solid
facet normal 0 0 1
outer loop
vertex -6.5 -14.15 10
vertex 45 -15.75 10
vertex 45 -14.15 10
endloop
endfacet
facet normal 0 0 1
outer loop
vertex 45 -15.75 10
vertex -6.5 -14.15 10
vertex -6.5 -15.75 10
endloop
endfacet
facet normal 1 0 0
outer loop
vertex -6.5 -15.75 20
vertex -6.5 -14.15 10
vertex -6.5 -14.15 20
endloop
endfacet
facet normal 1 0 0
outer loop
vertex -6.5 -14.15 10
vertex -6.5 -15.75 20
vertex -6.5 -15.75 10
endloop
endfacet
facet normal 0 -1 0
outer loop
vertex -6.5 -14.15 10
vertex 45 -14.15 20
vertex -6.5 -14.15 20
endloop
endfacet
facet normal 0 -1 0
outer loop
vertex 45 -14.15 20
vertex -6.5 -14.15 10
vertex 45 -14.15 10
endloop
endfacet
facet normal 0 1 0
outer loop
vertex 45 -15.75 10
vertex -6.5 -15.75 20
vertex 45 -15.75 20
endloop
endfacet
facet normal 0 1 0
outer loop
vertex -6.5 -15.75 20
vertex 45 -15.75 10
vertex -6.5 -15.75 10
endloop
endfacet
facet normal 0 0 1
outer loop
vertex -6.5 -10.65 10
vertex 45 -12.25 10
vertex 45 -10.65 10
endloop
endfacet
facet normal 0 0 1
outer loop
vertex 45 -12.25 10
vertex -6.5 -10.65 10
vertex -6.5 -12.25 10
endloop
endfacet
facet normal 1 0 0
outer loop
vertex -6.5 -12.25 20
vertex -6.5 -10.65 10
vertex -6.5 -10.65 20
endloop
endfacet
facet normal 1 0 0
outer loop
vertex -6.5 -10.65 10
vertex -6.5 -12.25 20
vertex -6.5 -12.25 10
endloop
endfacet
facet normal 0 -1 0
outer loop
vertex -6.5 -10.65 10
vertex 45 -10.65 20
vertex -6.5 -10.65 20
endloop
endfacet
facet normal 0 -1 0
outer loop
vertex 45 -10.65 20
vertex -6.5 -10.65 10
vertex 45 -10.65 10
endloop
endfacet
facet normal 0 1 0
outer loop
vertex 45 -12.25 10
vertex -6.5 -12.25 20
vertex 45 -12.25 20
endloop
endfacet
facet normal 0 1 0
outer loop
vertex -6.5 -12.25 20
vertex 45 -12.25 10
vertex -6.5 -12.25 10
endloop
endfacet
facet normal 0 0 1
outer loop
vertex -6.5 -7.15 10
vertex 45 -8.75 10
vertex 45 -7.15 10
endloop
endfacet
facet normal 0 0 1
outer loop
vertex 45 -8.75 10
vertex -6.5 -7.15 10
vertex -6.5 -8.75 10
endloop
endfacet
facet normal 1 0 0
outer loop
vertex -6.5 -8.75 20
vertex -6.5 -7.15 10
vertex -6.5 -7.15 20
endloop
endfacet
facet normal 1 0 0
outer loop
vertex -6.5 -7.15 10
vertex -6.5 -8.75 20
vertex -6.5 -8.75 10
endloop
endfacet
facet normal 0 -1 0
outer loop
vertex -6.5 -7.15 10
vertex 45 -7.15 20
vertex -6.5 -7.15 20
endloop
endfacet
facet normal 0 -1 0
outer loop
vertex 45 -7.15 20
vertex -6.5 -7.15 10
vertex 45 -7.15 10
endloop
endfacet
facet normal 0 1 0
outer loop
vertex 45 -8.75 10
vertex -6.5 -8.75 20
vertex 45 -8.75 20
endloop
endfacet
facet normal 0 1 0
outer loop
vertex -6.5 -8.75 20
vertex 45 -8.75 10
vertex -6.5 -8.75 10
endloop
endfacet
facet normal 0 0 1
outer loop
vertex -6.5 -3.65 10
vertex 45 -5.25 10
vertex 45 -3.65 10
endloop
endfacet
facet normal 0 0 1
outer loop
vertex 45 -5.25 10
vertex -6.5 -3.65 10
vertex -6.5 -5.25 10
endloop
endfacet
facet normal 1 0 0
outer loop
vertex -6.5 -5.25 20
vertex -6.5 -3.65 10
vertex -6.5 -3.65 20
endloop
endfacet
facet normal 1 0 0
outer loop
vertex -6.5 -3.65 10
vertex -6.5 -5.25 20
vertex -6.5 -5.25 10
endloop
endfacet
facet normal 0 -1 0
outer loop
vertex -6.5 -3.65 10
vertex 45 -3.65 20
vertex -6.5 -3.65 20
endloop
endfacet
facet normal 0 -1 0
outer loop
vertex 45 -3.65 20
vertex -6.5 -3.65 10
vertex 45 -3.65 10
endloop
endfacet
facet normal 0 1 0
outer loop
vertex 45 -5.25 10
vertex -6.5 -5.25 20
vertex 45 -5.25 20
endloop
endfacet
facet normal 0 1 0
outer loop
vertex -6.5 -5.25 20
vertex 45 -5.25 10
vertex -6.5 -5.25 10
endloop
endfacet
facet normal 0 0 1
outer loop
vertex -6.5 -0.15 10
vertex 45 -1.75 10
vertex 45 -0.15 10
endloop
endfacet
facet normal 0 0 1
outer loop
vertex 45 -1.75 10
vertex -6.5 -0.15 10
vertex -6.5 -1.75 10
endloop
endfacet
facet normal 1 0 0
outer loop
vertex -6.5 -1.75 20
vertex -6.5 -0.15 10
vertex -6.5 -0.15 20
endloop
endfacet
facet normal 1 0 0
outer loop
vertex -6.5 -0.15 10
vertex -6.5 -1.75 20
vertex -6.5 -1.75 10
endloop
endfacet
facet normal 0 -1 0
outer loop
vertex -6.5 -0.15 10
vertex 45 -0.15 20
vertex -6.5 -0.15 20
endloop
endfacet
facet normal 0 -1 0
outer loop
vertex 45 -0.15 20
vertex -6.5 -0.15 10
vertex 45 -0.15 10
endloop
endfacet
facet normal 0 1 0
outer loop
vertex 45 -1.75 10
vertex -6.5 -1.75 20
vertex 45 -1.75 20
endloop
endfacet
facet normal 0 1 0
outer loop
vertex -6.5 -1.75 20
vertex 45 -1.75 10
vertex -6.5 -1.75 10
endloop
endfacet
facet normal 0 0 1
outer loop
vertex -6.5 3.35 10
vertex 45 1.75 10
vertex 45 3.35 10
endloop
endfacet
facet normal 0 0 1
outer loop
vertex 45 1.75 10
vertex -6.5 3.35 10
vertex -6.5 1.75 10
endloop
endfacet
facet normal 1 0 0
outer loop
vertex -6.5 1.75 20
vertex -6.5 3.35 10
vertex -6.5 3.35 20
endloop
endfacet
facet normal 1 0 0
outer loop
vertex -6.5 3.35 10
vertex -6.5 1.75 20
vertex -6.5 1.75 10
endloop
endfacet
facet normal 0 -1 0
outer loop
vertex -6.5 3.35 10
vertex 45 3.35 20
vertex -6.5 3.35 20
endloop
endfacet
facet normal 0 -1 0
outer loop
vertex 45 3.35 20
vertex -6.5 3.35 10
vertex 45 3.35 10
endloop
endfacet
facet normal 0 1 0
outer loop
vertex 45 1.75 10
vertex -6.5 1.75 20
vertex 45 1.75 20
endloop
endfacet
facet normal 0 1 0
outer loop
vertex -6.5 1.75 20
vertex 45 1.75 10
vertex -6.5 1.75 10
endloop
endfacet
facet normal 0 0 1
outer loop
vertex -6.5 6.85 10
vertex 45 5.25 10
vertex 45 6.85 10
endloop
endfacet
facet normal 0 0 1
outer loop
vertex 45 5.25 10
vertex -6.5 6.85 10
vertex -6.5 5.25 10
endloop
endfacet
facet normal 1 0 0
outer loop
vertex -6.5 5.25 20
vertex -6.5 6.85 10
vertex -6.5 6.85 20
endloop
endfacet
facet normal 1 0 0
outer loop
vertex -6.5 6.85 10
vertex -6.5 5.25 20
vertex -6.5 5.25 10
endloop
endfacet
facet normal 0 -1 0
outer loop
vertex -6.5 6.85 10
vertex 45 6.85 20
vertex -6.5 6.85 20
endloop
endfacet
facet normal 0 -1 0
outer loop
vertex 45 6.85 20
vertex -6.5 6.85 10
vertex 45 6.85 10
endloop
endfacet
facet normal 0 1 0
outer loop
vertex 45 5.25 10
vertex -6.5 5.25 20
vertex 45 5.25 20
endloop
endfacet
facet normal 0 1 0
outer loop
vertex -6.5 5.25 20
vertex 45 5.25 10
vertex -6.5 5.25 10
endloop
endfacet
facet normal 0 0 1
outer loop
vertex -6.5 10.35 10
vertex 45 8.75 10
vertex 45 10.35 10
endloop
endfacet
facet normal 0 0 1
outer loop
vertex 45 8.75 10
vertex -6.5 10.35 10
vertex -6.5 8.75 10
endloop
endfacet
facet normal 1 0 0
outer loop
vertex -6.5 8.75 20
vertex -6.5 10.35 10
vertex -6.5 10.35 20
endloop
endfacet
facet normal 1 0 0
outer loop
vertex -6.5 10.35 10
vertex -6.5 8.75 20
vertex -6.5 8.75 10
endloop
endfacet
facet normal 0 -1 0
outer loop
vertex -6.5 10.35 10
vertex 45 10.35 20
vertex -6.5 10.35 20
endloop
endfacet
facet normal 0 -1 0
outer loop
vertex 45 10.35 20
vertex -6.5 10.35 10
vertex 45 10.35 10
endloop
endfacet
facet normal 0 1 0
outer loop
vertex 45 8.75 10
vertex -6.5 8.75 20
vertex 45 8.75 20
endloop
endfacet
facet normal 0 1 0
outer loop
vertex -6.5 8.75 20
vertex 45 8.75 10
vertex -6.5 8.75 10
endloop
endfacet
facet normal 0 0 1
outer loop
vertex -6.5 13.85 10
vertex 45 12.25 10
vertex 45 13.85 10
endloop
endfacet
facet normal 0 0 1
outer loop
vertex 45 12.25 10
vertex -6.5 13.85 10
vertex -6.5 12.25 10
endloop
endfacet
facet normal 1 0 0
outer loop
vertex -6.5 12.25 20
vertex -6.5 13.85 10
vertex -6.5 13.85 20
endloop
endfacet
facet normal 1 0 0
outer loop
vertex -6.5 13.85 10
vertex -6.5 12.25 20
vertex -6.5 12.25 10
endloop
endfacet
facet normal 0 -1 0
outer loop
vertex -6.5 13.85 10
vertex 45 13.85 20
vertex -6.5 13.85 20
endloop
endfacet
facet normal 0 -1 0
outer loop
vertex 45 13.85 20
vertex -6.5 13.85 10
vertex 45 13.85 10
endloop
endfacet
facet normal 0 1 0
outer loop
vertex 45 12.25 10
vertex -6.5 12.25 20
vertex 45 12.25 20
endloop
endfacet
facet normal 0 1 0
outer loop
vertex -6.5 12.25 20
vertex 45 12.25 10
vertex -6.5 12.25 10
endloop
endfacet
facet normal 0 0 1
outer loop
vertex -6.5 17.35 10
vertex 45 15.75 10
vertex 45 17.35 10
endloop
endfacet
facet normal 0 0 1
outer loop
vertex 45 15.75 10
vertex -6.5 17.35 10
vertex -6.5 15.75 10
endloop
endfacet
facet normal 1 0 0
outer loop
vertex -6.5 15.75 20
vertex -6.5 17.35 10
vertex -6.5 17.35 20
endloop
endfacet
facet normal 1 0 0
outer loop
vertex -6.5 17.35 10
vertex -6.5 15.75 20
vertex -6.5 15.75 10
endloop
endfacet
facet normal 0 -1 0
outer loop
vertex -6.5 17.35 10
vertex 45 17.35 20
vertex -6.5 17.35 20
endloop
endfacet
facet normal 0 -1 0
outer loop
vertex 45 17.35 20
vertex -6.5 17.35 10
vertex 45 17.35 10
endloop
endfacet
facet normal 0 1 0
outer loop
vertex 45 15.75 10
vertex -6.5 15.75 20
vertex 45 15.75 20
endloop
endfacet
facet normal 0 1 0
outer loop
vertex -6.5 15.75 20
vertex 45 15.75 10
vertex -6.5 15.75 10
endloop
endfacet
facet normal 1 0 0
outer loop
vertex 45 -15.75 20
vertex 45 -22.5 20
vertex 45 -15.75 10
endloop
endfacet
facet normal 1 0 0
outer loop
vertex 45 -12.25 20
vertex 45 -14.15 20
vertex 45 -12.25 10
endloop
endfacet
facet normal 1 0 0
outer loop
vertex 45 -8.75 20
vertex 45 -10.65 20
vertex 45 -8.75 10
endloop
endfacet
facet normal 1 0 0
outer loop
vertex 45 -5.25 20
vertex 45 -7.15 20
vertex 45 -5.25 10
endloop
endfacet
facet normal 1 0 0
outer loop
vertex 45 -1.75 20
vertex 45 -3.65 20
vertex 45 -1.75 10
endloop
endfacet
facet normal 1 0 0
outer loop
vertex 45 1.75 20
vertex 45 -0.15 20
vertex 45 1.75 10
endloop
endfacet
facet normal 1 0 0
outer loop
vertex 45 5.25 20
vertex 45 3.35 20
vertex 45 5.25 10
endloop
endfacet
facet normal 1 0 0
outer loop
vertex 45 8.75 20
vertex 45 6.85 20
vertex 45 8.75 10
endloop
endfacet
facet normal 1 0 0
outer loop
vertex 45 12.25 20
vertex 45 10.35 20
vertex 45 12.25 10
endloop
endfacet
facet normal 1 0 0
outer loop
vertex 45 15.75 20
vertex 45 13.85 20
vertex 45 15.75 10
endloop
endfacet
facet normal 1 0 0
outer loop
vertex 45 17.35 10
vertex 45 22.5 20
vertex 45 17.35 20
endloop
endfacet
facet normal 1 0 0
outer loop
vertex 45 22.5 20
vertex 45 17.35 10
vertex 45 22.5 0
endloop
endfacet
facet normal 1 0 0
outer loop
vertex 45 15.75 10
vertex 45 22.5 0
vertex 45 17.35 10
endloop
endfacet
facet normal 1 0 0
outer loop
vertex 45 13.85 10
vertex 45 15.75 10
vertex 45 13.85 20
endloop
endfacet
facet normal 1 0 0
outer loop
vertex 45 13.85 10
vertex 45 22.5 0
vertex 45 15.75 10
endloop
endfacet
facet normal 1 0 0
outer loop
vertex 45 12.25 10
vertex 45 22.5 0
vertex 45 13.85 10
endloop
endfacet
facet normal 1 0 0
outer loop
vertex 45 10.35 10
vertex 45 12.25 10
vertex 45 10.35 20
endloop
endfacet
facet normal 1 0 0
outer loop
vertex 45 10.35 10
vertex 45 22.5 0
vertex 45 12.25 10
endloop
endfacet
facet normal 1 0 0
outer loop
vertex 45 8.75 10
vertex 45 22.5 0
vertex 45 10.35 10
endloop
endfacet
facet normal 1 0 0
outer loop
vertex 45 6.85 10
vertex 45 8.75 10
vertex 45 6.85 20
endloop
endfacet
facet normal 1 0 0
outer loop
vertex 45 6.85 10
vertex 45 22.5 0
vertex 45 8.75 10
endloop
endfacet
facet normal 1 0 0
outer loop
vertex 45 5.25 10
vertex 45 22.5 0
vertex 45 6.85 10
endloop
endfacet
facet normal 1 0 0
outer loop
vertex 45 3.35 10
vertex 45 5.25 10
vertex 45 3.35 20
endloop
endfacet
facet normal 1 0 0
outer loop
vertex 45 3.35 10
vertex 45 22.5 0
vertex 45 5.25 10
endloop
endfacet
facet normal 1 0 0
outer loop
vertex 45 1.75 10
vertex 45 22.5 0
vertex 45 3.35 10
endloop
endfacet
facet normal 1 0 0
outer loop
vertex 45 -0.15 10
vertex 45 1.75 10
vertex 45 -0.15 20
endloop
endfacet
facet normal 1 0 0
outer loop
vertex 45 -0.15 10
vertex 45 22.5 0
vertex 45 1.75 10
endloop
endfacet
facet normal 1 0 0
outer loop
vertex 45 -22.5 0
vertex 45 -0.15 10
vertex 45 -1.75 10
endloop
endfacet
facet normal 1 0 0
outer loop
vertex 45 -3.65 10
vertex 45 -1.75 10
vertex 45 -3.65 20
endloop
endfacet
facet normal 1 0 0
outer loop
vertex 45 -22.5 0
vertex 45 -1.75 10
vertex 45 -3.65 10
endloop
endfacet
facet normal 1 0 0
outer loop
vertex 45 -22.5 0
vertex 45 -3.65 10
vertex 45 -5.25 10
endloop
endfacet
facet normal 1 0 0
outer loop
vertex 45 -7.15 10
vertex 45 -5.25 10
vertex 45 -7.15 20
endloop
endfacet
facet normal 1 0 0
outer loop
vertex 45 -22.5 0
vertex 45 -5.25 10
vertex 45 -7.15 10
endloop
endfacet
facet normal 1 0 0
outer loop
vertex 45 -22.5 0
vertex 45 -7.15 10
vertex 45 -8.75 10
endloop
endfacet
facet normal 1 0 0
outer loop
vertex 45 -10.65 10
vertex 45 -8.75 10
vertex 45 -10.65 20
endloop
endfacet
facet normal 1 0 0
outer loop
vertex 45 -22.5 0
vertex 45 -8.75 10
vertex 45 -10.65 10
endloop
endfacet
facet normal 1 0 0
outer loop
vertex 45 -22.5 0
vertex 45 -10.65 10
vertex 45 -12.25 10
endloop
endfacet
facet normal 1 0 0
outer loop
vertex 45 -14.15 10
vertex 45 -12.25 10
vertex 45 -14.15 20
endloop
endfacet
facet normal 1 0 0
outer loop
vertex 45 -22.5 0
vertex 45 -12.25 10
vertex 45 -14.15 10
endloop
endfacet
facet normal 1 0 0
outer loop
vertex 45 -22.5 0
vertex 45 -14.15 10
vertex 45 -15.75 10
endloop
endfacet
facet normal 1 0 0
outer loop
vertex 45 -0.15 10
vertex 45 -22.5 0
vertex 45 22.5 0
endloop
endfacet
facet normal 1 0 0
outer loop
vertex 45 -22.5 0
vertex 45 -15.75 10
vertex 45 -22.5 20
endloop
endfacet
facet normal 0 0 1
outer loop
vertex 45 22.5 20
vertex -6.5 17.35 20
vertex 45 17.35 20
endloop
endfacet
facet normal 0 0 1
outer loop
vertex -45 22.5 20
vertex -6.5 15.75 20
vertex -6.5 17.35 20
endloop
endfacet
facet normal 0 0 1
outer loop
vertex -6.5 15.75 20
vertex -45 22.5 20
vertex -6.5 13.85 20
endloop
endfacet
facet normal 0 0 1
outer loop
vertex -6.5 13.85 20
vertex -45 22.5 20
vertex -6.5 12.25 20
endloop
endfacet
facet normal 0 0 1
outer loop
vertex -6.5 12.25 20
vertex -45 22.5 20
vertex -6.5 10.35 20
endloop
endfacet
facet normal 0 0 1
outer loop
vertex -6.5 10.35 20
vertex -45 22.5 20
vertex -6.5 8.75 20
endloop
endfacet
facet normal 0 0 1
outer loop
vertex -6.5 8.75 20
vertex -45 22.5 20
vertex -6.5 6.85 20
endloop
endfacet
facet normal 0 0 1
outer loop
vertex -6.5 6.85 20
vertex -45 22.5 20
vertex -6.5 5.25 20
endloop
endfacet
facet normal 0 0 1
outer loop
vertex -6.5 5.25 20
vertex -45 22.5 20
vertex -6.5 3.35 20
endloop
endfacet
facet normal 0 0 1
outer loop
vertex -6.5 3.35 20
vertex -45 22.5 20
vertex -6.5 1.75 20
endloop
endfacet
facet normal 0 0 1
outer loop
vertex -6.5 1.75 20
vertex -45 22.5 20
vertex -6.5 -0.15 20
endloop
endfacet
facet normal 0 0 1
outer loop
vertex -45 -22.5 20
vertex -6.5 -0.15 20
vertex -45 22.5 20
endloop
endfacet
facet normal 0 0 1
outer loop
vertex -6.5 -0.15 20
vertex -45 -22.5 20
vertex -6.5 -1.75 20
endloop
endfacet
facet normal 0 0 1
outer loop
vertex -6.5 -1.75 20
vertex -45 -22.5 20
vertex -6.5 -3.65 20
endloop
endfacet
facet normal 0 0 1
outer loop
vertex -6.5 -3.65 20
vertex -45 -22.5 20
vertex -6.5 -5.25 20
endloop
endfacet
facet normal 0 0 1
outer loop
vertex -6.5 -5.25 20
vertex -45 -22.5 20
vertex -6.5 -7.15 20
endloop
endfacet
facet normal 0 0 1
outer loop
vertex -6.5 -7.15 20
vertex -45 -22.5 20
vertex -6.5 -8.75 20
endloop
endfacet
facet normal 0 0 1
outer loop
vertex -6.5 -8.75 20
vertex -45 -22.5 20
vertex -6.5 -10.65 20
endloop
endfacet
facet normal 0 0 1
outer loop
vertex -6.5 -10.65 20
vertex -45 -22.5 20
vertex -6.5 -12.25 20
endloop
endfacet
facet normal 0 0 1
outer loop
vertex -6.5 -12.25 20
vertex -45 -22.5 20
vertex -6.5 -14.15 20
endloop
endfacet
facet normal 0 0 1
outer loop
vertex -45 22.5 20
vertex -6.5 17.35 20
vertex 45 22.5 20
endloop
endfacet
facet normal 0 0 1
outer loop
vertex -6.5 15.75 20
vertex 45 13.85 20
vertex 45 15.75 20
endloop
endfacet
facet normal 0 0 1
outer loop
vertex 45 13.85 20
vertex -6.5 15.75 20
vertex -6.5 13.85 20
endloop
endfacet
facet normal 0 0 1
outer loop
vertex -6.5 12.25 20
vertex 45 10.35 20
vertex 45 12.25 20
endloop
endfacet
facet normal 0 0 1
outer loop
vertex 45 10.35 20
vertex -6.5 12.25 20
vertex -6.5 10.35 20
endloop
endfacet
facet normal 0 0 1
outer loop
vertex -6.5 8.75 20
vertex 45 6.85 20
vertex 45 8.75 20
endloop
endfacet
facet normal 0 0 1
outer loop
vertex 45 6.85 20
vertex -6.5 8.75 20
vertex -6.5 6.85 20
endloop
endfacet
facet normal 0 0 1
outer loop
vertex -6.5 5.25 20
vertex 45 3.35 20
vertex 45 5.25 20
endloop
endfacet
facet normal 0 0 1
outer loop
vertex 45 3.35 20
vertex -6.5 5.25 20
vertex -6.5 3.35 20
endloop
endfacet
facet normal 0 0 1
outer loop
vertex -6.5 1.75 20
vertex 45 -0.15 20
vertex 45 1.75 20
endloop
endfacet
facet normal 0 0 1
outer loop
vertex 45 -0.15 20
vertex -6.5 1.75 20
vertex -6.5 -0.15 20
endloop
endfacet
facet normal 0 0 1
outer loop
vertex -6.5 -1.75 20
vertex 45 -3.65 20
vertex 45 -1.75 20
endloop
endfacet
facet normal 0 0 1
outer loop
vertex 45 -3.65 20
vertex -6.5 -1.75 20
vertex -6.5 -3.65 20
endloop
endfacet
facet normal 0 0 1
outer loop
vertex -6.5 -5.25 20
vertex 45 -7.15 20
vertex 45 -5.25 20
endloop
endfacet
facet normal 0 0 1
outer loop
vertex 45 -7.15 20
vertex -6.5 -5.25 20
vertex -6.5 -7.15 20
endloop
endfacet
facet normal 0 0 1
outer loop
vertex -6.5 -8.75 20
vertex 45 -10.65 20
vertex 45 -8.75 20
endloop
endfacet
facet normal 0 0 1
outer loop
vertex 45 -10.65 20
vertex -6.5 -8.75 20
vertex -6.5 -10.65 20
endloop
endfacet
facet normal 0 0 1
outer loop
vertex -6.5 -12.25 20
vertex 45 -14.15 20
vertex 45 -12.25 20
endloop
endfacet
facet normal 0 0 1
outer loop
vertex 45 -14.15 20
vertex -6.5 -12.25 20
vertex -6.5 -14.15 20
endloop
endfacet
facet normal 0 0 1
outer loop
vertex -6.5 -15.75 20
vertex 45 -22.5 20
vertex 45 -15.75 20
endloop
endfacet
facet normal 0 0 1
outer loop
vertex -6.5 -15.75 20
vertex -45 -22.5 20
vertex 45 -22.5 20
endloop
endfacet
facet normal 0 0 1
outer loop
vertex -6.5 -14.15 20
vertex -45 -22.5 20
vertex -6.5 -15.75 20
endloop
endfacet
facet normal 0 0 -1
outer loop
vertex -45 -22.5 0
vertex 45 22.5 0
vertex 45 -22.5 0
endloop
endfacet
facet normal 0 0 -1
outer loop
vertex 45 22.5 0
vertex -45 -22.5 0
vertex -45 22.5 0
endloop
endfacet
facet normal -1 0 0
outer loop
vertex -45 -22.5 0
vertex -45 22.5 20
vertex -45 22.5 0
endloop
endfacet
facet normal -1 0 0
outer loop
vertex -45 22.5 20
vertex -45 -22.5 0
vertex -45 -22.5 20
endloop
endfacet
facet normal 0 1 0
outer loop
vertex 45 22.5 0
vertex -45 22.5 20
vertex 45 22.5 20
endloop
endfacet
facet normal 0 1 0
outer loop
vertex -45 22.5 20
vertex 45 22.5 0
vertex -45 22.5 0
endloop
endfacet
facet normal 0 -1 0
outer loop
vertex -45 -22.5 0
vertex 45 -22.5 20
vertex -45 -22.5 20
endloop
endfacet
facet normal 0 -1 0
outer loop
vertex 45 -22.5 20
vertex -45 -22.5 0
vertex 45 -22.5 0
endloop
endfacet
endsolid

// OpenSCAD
// Slide drying rack - holds 10 microscope slides standing on their long edge
// Print orientation: base block on the bed (z = 0), slots open upward.

// ---------------- Parameters ----------------
n_slots      = 10;    // number of slide slots
slide_len    = 75;    // slide length along X (mm)
slide_wid    = 25;    // slide width along Y (mm)
slide_thk    = 1;     // slide thickness along Z (mm)

base_len     = 90;    // base block length along X (mm)
base_wid     = 45;    // base block width along Y (mm)
base_h       = 20;    // base block height along Z (mm)

slot_len     = 77;    // slot length along X (mm)   (overlaps the block in X)
slot_w       = 1.6;   // slot width along Y (mm)
slot_depth   = 10;    // slot depth from top face (mm)

slot_pitch   = 3.5;   // centre-to-centre slot spacing along Y (mm)

eps          = 0.5;   // cutter overshoot past the top face (mm)
$fn          = 64;    // circle resolution (no curves here, set per the rules)

// ---------------- Derived ----------------
slot_x0 = -(base_len - slot_len) / 2;   // first slot start X (keeps group centred)
// With 10 slots at 3.5 mm pitch the span is 31.5 mm, leaving 58.5 mm of
// wall on each side, so the cutter stays inside the block at both ends.

// ---------------- Model ----------------
difference() {
    // Solid base block
    translate([-base_len / 2, -base_wid / 2, 0])
        cube([base_len, base_wid, base_h]);

    // Parallel slots, open at the top
    for (i = [0 : n_slots - 1]) {
        translate([slot_x0,
                   (i - (n_slots - 1) / 2) * slot_pitch,
                   base_h - slot_depth])
            cube([slot_len, slot_w, slot_depth + eps]);
    }
}
